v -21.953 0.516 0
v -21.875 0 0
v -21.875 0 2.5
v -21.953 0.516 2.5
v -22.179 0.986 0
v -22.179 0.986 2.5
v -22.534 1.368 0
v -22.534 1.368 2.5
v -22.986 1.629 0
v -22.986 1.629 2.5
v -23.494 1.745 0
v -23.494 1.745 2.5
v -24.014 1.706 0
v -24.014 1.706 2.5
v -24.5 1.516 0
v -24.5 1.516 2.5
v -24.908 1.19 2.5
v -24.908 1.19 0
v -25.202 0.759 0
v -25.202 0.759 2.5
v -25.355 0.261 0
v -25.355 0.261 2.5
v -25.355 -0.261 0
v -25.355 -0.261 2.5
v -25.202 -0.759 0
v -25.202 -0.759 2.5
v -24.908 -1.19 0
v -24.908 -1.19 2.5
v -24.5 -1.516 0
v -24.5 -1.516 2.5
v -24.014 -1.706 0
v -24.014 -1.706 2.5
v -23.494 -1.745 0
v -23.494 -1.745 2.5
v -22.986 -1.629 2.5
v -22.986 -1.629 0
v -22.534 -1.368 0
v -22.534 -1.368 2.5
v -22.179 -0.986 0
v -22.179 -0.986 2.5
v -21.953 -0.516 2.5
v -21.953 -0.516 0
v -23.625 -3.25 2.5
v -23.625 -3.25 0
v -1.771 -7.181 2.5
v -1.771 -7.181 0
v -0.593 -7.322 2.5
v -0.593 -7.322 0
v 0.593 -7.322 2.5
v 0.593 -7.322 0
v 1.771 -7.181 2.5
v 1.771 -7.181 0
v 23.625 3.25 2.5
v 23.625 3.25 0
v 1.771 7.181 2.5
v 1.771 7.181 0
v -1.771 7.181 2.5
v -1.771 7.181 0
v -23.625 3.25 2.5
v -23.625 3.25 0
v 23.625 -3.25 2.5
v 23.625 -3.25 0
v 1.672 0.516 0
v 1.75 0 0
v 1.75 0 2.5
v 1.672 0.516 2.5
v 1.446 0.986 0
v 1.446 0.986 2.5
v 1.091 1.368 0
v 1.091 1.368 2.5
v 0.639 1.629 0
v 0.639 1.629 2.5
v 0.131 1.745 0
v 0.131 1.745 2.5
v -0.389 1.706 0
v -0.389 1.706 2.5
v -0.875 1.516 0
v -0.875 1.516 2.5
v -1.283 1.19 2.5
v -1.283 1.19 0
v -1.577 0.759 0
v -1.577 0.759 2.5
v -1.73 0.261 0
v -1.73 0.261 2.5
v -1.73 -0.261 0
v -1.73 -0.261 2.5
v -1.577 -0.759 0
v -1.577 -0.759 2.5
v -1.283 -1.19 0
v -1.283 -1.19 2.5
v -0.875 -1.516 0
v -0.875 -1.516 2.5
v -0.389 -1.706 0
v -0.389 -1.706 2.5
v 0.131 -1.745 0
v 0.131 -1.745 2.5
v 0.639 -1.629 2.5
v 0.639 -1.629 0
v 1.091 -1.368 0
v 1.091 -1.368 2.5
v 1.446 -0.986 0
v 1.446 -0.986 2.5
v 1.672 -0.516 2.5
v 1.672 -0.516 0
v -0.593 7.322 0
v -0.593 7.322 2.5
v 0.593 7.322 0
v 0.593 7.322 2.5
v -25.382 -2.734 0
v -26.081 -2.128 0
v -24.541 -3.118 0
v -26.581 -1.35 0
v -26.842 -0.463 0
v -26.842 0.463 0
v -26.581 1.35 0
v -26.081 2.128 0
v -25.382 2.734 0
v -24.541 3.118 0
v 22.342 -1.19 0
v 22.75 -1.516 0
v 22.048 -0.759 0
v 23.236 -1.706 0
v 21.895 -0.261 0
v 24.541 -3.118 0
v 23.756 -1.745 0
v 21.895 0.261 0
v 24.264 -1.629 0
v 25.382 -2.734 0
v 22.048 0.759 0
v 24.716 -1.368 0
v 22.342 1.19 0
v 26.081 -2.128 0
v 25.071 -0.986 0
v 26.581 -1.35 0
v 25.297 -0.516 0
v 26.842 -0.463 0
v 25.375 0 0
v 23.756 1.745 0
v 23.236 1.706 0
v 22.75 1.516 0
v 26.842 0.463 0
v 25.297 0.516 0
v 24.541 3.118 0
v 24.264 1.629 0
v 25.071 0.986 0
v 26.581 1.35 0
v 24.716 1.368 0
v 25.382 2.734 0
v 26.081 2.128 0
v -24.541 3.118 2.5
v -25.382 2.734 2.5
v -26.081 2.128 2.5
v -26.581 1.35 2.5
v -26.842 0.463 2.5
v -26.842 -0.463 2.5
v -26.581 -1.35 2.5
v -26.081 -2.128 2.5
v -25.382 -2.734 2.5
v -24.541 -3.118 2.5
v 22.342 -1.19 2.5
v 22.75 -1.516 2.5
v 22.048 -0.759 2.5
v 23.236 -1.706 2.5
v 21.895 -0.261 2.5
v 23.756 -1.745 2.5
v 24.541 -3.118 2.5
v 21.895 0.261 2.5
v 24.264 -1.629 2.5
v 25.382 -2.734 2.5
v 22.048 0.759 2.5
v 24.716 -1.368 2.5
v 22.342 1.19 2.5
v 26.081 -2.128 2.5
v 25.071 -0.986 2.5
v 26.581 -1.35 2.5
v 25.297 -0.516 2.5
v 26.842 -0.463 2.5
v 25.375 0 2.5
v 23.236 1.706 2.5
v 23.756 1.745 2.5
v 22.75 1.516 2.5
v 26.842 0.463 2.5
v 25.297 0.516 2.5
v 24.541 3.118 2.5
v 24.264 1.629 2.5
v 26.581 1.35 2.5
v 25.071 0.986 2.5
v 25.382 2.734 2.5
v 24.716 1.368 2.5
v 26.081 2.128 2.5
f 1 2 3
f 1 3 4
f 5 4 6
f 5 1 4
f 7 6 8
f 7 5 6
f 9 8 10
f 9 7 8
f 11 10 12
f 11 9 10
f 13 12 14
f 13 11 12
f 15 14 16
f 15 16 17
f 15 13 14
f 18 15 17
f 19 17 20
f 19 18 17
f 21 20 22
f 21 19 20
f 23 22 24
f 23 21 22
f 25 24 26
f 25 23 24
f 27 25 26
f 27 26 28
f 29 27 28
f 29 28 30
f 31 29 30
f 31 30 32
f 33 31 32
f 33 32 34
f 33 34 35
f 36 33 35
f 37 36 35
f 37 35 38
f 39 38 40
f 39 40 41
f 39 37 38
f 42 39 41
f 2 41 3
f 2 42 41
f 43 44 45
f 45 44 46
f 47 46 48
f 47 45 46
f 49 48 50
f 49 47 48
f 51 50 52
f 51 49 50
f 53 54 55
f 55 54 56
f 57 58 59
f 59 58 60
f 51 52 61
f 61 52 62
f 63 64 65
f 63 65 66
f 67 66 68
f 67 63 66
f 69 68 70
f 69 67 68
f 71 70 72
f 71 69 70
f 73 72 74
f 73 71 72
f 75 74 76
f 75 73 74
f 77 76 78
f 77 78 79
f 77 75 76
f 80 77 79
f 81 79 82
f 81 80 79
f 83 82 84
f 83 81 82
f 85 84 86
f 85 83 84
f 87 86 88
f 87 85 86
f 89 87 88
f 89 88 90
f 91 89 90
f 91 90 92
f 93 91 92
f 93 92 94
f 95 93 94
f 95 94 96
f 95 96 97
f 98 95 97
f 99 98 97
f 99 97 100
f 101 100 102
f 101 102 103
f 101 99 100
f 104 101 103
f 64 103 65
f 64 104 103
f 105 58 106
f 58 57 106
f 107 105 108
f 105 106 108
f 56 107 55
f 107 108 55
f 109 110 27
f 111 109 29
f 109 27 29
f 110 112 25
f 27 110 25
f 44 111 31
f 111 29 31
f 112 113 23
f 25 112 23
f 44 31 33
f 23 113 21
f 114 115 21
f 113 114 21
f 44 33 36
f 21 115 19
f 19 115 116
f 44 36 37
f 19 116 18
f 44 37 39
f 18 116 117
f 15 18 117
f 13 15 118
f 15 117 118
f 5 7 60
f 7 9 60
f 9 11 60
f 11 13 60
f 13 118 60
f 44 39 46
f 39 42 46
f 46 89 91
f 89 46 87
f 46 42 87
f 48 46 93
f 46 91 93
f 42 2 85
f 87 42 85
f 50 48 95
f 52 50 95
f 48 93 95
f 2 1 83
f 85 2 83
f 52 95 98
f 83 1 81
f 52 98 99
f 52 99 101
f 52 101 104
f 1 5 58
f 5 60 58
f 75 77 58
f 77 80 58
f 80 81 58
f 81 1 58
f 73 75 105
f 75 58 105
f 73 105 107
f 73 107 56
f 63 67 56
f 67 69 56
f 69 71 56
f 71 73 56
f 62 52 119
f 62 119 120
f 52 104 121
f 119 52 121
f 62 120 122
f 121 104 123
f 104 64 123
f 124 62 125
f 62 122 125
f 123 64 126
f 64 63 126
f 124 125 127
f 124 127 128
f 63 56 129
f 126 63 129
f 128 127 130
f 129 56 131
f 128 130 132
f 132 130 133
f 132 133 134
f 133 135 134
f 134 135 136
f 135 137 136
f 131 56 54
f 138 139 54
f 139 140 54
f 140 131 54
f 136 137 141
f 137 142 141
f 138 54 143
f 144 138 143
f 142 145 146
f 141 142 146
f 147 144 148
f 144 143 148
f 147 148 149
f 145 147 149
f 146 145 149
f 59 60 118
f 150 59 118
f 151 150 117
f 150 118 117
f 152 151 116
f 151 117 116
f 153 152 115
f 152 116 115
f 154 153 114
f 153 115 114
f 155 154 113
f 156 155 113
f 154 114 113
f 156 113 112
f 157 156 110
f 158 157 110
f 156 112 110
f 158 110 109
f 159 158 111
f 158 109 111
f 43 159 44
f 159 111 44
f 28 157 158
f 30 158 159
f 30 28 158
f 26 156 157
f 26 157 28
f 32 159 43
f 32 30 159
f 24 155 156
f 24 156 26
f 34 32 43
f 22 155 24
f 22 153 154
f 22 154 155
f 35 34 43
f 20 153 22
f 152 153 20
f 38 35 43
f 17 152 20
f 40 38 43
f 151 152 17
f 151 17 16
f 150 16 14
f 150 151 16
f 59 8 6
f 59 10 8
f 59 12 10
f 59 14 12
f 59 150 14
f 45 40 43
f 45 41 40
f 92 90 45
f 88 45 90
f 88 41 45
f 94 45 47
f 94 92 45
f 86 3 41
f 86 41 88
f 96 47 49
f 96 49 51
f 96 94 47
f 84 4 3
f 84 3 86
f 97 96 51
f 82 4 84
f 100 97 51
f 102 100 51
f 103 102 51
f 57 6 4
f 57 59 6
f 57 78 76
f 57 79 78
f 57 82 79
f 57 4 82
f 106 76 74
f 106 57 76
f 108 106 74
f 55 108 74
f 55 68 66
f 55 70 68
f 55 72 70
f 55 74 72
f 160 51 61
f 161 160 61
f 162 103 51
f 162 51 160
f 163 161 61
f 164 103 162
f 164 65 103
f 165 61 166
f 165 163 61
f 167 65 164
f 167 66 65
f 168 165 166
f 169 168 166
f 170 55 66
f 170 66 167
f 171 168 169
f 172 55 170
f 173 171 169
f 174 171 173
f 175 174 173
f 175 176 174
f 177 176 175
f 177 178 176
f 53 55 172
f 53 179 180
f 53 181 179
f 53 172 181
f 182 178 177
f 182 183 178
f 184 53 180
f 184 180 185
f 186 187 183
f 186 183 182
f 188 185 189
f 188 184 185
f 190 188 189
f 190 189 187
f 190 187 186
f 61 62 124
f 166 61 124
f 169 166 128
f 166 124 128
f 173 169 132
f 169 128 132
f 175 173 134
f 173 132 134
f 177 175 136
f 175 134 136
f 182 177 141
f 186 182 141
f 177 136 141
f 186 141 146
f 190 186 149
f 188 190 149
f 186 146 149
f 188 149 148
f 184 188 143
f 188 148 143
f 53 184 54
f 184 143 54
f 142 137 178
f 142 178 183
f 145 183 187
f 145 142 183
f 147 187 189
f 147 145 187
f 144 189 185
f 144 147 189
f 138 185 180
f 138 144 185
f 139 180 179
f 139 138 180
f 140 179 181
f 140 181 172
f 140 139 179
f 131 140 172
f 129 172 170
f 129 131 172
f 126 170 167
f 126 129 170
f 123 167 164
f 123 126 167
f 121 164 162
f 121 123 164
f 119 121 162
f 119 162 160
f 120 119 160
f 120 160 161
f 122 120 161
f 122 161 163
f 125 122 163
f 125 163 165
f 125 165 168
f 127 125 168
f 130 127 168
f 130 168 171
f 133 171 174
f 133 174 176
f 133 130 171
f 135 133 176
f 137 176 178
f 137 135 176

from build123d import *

# Parameters (mm, degrees)
SKETCH1_R           = 1.75
BOSS_EXTRUDE1_DEPTH = 2.5
FILLET1_R           = 10


with BuildPart() as part:
    # Sketch1 → Boss-Extrude1 (new body)
    with BuildSketch(Plane.XY):
        with BuildLine():
            ThreePointArc((-23.625, 3.25), (-26.875, 0), (-23.625, -3.25))
            Line((-23.625, -3.25), (0, -7.5))
            Line((0, -7.5), (23.625, -3.25))
            ThreePointArc((23.625, -3.25), (26.875, 0), (23.625, 3.25))
            Line((23.625, 3.25), (0, 7.5))
            Line((0, 7.5), (-23.625, 3.25))
        make_face()
        with Locations((-23.625, 0)):
            Circle(SKETCH1_R, mode=Mode.SUBTRACT)
        Circle(SKETCH1_R, mode=Mode.SUBTRACT)
        with Locations((23.625, 0)):
            Circle(SKETCH1_R, mode=Mode.SUBTRACT)
    extrude(amount=BOSS_EXTRUDE1_DEPTH)

    # Fillet1
    fillet1_edges = [part.edges().sort_by_distance(p)[0] for p in [
        (0, -7.5, 1.25),
        (0, 7.5, 1.25),
    ]]
    fillet(fillet1_edges, radius=FILLET1_R)


solid = part.part
